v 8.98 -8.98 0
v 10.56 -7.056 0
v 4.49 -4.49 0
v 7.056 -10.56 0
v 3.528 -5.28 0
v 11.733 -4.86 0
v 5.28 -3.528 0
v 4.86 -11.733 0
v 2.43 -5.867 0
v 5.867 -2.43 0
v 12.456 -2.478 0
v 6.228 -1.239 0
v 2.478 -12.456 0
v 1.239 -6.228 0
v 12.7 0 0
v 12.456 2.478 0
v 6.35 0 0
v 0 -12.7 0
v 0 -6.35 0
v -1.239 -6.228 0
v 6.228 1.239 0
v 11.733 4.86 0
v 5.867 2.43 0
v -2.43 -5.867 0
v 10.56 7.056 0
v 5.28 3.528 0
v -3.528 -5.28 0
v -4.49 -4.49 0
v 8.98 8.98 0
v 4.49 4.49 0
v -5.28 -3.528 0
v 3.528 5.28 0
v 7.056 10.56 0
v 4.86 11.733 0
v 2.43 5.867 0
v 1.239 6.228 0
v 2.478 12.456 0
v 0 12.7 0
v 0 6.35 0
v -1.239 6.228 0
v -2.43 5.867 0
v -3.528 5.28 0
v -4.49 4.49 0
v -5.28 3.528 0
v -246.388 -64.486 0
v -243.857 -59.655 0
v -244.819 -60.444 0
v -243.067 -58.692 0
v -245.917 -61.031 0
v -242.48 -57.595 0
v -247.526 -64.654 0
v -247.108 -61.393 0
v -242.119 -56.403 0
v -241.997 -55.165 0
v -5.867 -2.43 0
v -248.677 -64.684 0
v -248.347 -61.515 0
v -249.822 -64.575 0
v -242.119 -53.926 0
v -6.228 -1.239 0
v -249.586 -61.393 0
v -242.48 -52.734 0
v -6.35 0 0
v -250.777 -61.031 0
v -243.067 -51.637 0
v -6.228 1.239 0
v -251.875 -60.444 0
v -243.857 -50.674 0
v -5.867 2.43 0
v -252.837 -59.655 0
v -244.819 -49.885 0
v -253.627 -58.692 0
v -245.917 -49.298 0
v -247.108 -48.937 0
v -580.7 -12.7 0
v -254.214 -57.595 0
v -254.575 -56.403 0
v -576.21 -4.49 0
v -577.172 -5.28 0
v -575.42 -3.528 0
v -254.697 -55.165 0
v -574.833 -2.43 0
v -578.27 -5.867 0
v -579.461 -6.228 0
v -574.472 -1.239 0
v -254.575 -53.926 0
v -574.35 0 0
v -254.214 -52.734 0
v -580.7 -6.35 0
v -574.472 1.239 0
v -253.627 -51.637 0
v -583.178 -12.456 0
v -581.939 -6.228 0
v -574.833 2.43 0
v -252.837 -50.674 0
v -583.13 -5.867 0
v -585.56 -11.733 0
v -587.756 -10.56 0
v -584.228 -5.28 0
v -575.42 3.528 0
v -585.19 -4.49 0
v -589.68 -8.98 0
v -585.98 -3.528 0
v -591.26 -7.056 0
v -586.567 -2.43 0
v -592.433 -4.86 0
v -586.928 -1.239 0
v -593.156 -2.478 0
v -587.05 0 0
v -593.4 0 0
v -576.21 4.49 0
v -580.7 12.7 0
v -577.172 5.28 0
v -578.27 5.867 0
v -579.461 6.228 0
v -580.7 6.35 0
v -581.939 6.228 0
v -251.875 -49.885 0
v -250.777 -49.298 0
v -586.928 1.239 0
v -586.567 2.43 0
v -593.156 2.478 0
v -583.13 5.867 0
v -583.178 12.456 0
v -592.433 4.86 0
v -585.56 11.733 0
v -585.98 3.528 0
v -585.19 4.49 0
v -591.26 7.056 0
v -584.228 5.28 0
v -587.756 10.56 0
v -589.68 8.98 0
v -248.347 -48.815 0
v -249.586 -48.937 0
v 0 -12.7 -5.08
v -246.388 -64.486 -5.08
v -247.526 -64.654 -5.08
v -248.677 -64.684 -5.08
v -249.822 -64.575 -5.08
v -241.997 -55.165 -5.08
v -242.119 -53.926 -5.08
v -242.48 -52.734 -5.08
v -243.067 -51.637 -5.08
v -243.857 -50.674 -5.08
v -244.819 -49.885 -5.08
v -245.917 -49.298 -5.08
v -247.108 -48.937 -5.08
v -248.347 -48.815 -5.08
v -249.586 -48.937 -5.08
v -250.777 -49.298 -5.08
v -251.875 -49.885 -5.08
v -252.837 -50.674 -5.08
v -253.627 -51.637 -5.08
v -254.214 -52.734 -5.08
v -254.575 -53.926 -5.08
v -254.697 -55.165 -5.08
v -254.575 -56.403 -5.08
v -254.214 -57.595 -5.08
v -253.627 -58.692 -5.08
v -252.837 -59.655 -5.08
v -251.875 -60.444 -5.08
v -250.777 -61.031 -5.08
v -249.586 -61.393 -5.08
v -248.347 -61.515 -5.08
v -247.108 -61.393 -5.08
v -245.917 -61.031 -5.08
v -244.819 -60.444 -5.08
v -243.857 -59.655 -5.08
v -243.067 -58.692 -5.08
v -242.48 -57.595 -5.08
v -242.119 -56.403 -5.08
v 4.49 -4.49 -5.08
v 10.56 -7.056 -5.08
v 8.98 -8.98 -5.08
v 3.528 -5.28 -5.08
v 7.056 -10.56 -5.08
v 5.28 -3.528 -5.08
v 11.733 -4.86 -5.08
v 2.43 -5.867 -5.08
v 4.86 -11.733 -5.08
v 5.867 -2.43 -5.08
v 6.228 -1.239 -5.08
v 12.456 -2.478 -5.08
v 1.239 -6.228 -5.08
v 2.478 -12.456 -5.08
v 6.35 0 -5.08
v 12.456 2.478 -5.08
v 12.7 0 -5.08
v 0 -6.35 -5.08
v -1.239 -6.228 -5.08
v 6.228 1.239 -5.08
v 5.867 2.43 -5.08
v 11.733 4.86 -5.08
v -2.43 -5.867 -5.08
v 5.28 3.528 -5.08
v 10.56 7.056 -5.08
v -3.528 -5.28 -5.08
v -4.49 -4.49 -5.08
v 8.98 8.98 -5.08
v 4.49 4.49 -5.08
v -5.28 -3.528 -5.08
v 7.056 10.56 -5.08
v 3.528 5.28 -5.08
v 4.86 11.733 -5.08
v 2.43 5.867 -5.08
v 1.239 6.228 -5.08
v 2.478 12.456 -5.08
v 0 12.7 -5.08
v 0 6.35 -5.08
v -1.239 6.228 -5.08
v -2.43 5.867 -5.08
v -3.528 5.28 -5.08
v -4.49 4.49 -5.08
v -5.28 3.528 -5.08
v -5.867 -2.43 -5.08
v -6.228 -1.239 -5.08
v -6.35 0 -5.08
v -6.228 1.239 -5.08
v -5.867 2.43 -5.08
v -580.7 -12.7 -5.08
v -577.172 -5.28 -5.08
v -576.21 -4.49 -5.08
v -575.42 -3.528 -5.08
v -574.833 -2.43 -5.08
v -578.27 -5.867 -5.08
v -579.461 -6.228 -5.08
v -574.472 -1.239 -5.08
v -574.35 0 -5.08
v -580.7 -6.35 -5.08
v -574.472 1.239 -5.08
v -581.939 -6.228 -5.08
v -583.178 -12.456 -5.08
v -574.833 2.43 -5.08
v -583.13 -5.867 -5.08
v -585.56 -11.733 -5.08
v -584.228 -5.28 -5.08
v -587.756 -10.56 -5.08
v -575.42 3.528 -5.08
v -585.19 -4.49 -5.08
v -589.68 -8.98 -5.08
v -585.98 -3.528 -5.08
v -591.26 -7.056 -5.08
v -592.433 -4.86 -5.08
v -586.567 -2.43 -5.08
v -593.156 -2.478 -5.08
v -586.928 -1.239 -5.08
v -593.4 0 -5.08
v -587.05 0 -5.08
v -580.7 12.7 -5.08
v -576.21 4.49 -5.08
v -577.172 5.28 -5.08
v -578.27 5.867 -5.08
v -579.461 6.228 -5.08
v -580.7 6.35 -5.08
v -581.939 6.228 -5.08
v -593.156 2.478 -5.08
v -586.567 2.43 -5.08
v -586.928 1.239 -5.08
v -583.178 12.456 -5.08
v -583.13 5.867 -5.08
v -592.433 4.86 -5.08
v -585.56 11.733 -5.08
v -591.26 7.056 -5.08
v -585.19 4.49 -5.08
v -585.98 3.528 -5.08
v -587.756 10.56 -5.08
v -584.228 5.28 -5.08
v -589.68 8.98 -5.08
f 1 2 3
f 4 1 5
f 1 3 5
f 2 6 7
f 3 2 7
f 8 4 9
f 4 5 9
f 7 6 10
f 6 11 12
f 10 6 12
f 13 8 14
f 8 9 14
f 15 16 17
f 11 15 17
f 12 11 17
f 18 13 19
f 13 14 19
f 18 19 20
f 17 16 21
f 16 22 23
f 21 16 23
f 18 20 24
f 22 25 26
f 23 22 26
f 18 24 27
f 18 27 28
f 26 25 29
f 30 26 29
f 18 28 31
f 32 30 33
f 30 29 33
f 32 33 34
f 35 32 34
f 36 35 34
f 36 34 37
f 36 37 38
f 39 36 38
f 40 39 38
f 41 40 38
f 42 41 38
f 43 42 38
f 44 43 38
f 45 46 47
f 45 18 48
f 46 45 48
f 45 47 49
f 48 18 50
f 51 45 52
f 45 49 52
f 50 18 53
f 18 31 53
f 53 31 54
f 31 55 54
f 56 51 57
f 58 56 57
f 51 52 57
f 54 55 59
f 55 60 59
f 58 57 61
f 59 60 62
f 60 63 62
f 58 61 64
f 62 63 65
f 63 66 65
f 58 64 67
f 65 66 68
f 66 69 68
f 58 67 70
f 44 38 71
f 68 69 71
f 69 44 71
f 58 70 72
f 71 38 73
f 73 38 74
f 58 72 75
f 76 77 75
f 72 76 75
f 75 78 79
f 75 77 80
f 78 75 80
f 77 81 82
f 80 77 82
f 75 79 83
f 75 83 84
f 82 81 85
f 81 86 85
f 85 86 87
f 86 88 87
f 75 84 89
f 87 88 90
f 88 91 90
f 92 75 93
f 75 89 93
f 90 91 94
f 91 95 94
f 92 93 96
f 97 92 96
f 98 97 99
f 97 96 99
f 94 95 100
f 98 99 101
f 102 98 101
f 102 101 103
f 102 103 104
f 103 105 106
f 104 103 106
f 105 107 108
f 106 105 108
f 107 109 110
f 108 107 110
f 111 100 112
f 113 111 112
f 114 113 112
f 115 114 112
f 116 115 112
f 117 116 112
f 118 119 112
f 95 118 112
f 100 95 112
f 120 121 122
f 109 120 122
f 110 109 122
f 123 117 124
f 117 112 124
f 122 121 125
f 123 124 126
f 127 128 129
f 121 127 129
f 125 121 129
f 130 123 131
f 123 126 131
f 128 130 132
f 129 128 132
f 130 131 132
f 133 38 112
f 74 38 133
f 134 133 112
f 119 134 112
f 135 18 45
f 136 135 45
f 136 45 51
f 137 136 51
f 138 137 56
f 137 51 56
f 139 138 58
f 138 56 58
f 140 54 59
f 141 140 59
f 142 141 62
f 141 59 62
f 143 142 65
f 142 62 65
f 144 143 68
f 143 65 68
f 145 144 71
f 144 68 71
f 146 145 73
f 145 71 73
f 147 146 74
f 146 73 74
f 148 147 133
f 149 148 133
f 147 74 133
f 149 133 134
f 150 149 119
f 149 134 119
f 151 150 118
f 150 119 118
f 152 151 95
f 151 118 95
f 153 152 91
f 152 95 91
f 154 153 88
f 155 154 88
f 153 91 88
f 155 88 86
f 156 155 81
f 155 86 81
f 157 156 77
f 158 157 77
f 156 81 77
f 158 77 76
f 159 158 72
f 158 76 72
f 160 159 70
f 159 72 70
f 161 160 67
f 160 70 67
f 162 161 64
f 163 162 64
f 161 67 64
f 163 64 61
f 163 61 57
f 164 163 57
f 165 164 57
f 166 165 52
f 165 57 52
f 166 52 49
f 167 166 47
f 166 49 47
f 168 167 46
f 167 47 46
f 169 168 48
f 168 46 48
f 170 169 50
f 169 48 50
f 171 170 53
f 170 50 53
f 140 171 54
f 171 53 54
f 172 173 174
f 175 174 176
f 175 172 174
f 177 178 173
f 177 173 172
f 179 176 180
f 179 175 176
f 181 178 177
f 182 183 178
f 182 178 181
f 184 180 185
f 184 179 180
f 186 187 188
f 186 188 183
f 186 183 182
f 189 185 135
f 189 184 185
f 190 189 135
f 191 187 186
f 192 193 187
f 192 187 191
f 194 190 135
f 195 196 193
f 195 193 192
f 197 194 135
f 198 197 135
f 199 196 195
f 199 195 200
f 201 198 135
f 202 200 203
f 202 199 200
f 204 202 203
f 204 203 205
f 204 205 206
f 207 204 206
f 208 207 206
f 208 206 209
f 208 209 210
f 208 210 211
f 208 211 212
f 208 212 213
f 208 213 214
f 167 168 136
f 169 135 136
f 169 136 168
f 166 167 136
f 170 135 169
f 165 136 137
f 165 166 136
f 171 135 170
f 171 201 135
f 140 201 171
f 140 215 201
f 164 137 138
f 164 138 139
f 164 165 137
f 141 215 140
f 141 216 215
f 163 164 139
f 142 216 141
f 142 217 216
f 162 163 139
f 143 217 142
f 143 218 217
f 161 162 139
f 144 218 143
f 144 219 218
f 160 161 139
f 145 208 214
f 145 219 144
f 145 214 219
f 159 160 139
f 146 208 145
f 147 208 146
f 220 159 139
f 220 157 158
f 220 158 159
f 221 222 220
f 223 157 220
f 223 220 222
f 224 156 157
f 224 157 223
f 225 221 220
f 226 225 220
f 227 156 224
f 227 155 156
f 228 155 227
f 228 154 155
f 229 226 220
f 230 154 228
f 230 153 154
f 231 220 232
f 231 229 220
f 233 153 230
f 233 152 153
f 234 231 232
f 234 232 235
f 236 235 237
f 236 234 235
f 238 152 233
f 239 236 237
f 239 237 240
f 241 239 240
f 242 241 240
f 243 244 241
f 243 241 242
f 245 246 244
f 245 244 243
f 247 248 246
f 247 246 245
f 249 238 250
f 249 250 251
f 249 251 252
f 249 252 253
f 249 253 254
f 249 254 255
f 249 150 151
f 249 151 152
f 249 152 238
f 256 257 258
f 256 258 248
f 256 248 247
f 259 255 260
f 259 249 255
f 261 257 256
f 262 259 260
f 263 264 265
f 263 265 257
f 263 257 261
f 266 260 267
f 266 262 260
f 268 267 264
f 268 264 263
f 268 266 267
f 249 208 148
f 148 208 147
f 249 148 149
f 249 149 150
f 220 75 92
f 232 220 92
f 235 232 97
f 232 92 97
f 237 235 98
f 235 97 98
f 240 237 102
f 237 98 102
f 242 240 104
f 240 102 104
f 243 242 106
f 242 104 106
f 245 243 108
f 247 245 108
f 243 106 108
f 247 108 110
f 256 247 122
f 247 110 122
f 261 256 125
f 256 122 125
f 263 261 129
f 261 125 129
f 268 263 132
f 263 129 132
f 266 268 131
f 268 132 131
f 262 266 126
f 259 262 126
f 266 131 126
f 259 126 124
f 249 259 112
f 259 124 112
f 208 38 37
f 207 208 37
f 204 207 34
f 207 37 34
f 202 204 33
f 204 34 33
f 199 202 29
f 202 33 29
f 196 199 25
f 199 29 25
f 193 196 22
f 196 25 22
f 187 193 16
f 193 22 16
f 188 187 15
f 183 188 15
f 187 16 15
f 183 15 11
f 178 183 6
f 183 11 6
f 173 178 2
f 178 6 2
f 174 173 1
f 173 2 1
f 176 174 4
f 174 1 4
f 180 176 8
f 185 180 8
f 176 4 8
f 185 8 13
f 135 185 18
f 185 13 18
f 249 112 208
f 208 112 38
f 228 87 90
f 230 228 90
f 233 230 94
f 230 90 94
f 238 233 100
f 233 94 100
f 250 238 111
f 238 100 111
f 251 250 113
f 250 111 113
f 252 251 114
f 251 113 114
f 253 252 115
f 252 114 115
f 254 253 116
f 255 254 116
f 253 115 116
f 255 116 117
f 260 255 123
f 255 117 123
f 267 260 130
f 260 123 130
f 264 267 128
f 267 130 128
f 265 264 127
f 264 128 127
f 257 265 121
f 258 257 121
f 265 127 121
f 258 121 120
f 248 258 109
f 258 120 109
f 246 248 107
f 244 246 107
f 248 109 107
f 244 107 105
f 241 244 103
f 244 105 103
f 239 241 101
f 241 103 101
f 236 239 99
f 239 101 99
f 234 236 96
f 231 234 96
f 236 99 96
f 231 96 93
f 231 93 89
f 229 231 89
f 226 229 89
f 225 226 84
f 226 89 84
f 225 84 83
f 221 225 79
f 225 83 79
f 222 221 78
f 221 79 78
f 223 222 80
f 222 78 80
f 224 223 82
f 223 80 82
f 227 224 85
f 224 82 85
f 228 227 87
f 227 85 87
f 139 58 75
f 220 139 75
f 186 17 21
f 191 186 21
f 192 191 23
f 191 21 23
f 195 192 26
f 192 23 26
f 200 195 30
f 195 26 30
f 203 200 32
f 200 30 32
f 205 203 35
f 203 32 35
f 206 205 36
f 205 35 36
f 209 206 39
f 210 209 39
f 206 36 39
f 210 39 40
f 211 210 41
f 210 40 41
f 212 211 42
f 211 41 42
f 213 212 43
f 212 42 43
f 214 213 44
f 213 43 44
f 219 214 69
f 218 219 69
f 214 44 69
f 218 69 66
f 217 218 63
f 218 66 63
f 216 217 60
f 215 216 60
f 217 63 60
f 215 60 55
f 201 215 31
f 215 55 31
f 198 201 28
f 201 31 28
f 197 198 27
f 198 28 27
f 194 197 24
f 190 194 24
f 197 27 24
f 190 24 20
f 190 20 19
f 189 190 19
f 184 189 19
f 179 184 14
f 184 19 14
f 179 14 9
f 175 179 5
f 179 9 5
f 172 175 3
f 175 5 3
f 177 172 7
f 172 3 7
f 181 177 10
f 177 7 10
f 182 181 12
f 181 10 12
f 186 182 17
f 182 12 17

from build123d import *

# Parameters (mm, degrees)
SKETCH1_R           = 6.35
BOSS_EXTRUDE1_DEPTH = 5.08


with BuildPart() as part:
    # Sketch1 → Boss-Extrude1 (new body)
    with BuildSketch(Plane.XY):
        with BuildLine():
            Line((-580.7, 12.7), (0, 12.7))
            ThreePointArc((0, 12.7), (12.7, 0), (0, -12.7))
            Line((0, -12.7), (-246.387841786, -64.485872398))
            ThreePointArc((-246.387841786, -64.485872398), (-248.101037656, -64.686359692), (-249.822299661, -64.574590494))
            Line((-249.822299661, -64.574590494), (-580.7, -12.7))
            ThreePointArc((-580.7, -12.7), (-593.4, 0), (-580.7, 12.7))
        make_face()
        Circle(SKETCH1_R, mode=Mode.SUBTRACT)
        with Locations((-580.7, 0)):
            Circle(SKETCH1_R, mode=Mode.SUBTRACT)
        with Locations((-248.347003133, -55.164536023)):
            Circle(SKETCH1_R, mode=Mode.SUBTRACT)
    extrude(amount=-BOSS_EXTRUDE1_DEPTH)


solid = part.part
